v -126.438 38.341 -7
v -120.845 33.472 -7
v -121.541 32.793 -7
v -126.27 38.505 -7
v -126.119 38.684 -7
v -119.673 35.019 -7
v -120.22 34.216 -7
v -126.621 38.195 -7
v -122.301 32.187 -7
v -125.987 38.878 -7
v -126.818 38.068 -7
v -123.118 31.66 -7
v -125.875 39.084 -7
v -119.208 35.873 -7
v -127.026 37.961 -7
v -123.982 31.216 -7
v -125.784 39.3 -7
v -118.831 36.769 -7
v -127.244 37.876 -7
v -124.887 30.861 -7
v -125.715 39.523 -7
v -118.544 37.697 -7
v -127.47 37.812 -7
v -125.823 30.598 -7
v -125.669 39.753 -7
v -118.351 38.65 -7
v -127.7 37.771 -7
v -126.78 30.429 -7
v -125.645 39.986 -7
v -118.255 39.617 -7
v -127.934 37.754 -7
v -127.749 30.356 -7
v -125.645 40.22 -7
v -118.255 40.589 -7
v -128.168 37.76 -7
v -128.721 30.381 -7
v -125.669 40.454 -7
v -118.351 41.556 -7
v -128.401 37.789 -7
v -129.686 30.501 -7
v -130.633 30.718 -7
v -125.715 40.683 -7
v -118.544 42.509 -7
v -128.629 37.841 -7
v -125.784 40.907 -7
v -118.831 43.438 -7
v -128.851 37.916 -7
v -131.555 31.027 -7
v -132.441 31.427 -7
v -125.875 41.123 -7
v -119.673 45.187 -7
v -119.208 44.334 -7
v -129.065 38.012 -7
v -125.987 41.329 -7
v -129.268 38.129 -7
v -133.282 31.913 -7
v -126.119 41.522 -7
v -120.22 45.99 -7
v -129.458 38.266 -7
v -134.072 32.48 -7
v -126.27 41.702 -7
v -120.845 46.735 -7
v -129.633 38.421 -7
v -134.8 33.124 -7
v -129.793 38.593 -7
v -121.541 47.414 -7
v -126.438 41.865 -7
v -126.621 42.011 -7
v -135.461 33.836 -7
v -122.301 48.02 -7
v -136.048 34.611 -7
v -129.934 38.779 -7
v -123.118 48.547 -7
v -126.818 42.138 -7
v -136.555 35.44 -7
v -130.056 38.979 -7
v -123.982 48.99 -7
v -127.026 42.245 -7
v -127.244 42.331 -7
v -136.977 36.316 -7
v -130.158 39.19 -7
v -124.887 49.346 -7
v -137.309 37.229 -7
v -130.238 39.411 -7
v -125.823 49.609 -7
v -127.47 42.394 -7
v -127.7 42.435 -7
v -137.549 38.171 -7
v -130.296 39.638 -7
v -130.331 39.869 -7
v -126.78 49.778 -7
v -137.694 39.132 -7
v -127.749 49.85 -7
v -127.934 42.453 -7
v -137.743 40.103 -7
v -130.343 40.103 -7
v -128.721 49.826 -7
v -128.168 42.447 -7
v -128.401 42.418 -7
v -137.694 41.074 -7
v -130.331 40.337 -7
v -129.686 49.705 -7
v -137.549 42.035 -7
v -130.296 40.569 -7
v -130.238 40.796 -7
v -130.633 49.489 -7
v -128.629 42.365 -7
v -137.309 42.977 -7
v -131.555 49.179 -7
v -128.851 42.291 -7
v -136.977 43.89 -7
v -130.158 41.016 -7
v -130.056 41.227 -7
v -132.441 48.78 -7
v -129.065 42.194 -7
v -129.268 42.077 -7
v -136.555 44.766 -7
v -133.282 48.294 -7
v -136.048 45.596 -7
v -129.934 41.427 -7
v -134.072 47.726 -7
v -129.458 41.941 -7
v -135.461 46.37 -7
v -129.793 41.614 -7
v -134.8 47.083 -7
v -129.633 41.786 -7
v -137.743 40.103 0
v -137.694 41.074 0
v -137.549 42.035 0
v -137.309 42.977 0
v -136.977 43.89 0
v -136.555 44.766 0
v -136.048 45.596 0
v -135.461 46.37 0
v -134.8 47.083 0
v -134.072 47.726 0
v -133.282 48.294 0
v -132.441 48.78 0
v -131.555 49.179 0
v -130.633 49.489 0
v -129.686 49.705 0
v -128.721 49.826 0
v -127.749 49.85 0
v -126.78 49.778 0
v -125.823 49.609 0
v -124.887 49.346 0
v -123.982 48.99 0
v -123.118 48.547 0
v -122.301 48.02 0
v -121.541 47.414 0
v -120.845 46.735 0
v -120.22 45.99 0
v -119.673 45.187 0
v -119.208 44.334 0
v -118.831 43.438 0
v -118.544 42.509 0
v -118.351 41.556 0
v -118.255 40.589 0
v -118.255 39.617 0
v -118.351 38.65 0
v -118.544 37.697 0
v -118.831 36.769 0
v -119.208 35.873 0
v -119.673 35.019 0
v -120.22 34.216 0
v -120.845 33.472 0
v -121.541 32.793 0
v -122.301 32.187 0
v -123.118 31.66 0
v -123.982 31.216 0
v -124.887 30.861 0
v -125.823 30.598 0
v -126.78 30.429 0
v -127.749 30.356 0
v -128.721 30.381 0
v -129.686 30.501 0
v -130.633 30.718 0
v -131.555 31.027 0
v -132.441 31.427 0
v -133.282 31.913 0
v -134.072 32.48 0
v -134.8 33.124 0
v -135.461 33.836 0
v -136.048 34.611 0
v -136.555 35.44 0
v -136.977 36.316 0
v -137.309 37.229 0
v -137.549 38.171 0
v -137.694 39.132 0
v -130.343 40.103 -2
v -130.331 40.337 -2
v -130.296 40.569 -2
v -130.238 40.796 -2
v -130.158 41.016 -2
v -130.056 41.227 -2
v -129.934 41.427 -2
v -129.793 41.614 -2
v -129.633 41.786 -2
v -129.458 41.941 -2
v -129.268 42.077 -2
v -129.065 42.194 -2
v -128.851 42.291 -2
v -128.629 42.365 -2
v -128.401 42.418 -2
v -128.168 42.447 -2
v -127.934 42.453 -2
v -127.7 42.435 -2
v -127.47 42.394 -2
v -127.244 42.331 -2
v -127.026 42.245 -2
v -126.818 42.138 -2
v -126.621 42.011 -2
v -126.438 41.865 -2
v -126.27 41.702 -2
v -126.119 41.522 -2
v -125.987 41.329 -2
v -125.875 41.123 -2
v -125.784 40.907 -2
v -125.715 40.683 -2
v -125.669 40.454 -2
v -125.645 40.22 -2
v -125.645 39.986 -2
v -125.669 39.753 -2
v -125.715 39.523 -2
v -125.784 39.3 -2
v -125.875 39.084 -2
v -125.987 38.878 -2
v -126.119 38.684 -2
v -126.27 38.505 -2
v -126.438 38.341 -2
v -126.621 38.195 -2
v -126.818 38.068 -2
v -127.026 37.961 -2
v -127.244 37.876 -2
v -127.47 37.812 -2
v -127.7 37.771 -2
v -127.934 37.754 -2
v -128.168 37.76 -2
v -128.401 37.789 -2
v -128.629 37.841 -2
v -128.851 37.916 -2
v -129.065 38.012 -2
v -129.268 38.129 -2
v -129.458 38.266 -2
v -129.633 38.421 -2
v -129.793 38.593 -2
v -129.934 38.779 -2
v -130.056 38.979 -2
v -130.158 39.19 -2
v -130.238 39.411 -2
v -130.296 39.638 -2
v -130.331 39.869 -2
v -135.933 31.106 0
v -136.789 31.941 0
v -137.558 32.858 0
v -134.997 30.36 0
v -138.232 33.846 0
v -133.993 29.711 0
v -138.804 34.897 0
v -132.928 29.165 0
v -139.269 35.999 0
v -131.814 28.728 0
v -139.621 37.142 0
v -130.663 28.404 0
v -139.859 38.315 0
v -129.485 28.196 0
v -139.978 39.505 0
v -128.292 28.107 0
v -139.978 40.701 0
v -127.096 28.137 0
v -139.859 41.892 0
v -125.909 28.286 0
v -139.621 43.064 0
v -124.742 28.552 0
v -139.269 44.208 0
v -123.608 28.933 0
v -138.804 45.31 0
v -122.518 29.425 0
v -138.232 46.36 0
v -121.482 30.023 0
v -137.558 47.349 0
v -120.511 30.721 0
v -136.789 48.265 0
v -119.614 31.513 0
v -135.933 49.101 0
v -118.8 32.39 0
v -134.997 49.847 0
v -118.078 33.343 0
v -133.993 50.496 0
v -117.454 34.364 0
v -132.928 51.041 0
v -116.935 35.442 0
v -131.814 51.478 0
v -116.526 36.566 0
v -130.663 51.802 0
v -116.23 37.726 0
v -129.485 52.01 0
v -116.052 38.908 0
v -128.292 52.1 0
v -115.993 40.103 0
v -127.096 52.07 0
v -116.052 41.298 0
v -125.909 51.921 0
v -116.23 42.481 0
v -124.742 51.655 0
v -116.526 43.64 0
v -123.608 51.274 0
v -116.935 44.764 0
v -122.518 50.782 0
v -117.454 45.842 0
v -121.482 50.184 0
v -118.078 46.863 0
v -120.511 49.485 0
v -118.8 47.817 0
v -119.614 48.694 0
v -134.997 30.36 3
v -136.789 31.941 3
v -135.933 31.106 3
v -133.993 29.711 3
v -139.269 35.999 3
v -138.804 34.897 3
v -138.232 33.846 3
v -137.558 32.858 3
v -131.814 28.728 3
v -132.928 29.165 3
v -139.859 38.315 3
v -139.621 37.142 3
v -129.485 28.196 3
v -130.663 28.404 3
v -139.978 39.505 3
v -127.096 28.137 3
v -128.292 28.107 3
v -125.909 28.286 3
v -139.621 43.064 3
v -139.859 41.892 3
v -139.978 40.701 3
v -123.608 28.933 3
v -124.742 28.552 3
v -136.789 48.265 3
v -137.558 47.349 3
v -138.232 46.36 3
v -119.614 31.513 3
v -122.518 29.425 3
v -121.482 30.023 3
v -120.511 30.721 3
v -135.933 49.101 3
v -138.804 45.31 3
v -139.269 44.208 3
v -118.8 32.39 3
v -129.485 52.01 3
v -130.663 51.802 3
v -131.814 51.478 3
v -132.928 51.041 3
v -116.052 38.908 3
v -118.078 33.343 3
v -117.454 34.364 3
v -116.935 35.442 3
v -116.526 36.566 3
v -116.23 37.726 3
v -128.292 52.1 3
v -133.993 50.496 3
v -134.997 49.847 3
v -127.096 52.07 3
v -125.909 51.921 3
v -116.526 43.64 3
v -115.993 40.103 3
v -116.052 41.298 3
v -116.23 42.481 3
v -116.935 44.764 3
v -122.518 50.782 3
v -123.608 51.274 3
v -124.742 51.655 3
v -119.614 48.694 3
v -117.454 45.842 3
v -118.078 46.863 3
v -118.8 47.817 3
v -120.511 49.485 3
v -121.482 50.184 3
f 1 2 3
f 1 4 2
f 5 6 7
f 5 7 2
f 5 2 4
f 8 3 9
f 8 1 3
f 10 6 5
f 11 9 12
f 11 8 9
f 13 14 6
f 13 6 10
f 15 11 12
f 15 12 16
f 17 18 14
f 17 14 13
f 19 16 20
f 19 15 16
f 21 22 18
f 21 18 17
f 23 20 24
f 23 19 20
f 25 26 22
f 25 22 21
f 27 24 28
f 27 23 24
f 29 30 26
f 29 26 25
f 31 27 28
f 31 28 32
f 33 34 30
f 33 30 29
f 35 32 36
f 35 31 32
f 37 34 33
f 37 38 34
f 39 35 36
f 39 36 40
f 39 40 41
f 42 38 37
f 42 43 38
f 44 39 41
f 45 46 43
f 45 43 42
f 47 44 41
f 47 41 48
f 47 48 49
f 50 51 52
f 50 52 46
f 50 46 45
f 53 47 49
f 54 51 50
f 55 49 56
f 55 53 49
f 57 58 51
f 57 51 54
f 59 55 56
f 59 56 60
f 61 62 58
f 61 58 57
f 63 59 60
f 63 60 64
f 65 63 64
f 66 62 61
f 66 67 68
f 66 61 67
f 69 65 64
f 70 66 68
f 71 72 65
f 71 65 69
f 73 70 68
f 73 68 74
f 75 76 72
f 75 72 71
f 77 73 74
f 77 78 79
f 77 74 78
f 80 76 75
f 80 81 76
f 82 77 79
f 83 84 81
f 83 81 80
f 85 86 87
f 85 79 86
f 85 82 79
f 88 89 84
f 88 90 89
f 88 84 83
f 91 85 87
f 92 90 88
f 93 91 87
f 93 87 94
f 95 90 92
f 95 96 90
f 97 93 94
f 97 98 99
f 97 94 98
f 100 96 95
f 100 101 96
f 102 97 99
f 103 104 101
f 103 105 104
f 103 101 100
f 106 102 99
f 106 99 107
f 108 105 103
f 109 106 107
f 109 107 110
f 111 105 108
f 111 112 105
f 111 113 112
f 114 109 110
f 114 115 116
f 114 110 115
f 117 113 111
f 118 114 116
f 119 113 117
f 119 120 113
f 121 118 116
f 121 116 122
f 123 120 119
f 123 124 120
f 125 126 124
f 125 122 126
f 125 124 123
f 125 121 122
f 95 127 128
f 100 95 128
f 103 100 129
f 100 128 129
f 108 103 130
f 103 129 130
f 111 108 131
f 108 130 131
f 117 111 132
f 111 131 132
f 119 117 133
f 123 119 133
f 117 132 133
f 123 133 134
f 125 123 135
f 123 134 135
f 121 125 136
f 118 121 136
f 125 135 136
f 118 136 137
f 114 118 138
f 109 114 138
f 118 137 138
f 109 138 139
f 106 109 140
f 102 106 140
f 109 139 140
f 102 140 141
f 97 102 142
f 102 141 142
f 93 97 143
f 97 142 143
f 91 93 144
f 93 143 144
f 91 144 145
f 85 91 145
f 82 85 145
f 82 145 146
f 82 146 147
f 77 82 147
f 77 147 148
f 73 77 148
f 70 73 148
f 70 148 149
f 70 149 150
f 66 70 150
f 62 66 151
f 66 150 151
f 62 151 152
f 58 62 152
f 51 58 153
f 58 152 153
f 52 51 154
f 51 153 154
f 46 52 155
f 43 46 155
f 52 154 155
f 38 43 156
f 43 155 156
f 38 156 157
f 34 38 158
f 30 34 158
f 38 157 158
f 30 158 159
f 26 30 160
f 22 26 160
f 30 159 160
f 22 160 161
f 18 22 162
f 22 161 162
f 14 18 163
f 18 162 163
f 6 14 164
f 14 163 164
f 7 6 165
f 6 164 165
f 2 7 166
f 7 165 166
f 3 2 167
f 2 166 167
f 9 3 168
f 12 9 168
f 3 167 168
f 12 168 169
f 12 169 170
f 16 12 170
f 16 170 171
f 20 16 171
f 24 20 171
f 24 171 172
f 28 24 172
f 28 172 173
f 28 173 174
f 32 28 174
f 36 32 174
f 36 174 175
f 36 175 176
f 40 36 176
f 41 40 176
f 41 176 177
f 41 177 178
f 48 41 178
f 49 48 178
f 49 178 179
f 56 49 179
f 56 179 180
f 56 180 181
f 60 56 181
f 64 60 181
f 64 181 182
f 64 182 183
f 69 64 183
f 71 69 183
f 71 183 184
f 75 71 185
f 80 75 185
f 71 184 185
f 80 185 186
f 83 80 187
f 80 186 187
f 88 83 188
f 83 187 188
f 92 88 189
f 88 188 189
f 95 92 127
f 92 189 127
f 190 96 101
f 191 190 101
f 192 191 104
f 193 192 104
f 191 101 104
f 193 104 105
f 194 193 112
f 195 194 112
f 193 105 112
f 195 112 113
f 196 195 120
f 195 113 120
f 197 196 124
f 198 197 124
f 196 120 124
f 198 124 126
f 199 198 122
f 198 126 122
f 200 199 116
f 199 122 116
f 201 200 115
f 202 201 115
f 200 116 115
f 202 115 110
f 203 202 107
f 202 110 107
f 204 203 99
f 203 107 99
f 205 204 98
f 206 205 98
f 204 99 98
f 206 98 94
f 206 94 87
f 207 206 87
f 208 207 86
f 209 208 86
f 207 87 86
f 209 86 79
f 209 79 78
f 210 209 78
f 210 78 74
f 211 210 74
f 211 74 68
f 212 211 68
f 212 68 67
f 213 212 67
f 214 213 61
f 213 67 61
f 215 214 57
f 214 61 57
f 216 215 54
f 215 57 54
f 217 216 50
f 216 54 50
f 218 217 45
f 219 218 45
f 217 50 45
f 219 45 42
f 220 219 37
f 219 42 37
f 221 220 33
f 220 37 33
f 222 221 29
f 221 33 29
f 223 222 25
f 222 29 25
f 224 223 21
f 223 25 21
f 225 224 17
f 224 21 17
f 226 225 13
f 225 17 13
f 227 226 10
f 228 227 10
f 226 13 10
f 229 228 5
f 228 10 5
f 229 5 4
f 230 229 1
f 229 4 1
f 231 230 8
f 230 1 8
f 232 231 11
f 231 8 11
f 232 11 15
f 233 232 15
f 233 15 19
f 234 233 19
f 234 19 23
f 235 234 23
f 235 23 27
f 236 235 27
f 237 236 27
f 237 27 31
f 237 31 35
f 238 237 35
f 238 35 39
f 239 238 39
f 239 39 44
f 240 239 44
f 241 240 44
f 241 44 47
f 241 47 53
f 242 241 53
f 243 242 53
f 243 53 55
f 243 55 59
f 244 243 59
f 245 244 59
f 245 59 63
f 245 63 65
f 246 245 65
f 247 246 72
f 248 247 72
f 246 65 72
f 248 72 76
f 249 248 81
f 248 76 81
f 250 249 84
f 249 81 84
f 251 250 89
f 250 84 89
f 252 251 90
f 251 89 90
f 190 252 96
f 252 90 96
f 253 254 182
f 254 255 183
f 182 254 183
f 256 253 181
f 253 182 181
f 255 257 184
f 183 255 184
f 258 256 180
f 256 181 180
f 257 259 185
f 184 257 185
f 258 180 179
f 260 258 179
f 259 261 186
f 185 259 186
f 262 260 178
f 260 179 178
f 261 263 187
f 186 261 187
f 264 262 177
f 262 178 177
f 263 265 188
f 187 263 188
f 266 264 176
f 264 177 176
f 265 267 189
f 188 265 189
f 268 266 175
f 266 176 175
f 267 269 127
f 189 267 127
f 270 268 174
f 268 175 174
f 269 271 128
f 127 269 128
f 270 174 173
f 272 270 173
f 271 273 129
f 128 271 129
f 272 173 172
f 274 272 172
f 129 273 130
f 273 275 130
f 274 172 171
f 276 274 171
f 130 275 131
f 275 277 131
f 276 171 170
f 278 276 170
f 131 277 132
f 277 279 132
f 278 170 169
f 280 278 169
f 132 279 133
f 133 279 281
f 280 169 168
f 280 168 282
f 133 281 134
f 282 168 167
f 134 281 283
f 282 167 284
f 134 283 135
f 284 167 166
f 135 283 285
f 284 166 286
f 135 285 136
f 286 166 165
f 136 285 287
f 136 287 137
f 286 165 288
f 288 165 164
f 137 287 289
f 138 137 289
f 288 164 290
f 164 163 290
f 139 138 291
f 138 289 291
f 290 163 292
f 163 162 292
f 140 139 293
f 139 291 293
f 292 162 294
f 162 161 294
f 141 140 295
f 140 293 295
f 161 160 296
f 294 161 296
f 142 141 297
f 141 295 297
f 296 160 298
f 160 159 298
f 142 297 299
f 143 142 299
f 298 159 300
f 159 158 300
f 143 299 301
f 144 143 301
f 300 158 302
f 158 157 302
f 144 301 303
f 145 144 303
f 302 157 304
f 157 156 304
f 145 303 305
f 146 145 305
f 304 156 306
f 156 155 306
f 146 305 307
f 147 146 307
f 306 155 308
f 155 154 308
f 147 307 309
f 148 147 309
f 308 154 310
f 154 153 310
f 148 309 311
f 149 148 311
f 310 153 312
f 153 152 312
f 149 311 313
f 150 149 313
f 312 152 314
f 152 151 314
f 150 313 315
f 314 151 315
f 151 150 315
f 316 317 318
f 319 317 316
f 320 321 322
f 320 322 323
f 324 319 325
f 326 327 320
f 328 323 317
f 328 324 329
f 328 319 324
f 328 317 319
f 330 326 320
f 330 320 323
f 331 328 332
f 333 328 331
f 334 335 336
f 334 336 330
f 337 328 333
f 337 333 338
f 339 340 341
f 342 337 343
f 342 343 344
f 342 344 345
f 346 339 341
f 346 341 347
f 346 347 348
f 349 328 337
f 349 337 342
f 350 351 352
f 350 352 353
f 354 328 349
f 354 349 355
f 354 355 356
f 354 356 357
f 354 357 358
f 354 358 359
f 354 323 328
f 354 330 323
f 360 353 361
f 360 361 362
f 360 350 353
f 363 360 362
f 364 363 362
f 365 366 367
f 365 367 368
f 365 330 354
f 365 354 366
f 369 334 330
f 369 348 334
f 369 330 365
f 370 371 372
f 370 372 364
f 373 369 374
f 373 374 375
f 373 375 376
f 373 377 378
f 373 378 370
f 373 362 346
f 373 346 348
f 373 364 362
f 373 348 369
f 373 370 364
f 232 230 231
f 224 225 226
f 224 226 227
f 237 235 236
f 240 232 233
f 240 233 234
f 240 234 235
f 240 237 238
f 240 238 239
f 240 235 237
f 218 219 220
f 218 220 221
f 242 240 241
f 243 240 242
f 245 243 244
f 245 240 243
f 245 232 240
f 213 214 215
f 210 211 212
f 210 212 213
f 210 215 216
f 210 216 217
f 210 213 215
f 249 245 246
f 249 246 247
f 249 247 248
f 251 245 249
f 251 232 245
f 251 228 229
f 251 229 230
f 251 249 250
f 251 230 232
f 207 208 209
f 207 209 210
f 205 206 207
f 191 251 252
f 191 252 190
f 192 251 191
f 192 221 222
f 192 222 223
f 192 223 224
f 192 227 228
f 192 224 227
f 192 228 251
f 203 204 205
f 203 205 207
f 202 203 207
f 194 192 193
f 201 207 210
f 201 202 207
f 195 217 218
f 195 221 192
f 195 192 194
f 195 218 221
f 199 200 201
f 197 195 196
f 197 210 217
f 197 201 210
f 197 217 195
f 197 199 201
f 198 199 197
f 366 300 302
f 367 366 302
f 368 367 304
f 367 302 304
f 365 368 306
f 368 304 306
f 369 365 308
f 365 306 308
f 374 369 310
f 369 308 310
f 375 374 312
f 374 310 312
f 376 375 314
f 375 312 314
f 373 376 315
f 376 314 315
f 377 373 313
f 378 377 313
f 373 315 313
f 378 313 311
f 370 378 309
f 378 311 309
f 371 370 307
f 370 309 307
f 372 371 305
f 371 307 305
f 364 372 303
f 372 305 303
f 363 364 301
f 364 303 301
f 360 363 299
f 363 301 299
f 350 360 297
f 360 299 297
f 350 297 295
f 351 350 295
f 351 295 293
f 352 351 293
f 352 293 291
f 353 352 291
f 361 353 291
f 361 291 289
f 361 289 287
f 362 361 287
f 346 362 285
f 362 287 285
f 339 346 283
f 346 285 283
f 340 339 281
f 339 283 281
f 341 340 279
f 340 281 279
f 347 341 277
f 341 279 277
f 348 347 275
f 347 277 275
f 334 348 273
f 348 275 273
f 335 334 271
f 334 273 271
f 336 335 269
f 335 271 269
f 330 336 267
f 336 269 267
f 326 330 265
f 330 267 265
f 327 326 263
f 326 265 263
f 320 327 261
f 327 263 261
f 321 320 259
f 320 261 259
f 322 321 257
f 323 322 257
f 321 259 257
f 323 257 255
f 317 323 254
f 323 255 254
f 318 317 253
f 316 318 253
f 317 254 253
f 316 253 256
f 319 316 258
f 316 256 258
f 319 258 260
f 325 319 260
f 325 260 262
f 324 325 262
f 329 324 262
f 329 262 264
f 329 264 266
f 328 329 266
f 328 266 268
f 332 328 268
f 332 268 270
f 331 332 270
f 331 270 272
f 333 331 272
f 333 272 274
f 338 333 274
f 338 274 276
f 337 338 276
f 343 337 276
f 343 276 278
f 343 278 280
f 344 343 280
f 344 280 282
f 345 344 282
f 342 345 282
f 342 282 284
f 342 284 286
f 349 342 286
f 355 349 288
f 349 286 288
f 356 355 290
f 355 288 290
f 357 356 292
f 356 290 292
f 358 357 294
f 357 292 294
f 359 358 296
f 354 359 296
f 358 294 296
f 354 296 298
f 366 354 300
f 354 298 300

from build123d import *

# Parameters (mm, degrees)
SKETCH1_R           = 12
BOSS_EXTRUDE1_DEPTH = 3
SKETCH2_R           = 9.75
BOSS_EXTRUDE2_DEPTH = 7
SKETCH3_R           = 2.35
CUT_EXTRUDE1_DEPTH  = 5


with BuildPart() as part:
    # Sketch1 → Boss-Extrude1 (new body)
    with BuildSketch(Plane.XY):
        with Locations((-127.992538975, 40.103259291)):
            Circle(SKETCH1_R)
    extrude(amount=BOSS_EXTRUDE1_DEPTH)

    # Sketch2 → Boss-Extrude2 (add)
    with BuildSketch(Plane(origin=(0, 0, 0), x_dir=(-1, 0, 0), z_dir=(0, 0, -1))):
        with Locations((127.992538975, 40.103259291)):
            Circle(SKETCH2_R)
    extrude(amount=BOSS_EXTRUDE2_DEPTH)

    # Sketch3 → Cut-Extrude1 (cut)
    with BuildSketch(Plane(origin=(0, 0, -7), x_dir=(-1, 0, 0), z_dir=(0, 0, -1))):
        with Locations((127.992538975, 40.103259291)):
            Circle(SKETCH3_R)
    extrude(amount=-CUT_EXTRUDE1_DEPTH, mode=Mode.SUBTRACT)


solid = part.part
